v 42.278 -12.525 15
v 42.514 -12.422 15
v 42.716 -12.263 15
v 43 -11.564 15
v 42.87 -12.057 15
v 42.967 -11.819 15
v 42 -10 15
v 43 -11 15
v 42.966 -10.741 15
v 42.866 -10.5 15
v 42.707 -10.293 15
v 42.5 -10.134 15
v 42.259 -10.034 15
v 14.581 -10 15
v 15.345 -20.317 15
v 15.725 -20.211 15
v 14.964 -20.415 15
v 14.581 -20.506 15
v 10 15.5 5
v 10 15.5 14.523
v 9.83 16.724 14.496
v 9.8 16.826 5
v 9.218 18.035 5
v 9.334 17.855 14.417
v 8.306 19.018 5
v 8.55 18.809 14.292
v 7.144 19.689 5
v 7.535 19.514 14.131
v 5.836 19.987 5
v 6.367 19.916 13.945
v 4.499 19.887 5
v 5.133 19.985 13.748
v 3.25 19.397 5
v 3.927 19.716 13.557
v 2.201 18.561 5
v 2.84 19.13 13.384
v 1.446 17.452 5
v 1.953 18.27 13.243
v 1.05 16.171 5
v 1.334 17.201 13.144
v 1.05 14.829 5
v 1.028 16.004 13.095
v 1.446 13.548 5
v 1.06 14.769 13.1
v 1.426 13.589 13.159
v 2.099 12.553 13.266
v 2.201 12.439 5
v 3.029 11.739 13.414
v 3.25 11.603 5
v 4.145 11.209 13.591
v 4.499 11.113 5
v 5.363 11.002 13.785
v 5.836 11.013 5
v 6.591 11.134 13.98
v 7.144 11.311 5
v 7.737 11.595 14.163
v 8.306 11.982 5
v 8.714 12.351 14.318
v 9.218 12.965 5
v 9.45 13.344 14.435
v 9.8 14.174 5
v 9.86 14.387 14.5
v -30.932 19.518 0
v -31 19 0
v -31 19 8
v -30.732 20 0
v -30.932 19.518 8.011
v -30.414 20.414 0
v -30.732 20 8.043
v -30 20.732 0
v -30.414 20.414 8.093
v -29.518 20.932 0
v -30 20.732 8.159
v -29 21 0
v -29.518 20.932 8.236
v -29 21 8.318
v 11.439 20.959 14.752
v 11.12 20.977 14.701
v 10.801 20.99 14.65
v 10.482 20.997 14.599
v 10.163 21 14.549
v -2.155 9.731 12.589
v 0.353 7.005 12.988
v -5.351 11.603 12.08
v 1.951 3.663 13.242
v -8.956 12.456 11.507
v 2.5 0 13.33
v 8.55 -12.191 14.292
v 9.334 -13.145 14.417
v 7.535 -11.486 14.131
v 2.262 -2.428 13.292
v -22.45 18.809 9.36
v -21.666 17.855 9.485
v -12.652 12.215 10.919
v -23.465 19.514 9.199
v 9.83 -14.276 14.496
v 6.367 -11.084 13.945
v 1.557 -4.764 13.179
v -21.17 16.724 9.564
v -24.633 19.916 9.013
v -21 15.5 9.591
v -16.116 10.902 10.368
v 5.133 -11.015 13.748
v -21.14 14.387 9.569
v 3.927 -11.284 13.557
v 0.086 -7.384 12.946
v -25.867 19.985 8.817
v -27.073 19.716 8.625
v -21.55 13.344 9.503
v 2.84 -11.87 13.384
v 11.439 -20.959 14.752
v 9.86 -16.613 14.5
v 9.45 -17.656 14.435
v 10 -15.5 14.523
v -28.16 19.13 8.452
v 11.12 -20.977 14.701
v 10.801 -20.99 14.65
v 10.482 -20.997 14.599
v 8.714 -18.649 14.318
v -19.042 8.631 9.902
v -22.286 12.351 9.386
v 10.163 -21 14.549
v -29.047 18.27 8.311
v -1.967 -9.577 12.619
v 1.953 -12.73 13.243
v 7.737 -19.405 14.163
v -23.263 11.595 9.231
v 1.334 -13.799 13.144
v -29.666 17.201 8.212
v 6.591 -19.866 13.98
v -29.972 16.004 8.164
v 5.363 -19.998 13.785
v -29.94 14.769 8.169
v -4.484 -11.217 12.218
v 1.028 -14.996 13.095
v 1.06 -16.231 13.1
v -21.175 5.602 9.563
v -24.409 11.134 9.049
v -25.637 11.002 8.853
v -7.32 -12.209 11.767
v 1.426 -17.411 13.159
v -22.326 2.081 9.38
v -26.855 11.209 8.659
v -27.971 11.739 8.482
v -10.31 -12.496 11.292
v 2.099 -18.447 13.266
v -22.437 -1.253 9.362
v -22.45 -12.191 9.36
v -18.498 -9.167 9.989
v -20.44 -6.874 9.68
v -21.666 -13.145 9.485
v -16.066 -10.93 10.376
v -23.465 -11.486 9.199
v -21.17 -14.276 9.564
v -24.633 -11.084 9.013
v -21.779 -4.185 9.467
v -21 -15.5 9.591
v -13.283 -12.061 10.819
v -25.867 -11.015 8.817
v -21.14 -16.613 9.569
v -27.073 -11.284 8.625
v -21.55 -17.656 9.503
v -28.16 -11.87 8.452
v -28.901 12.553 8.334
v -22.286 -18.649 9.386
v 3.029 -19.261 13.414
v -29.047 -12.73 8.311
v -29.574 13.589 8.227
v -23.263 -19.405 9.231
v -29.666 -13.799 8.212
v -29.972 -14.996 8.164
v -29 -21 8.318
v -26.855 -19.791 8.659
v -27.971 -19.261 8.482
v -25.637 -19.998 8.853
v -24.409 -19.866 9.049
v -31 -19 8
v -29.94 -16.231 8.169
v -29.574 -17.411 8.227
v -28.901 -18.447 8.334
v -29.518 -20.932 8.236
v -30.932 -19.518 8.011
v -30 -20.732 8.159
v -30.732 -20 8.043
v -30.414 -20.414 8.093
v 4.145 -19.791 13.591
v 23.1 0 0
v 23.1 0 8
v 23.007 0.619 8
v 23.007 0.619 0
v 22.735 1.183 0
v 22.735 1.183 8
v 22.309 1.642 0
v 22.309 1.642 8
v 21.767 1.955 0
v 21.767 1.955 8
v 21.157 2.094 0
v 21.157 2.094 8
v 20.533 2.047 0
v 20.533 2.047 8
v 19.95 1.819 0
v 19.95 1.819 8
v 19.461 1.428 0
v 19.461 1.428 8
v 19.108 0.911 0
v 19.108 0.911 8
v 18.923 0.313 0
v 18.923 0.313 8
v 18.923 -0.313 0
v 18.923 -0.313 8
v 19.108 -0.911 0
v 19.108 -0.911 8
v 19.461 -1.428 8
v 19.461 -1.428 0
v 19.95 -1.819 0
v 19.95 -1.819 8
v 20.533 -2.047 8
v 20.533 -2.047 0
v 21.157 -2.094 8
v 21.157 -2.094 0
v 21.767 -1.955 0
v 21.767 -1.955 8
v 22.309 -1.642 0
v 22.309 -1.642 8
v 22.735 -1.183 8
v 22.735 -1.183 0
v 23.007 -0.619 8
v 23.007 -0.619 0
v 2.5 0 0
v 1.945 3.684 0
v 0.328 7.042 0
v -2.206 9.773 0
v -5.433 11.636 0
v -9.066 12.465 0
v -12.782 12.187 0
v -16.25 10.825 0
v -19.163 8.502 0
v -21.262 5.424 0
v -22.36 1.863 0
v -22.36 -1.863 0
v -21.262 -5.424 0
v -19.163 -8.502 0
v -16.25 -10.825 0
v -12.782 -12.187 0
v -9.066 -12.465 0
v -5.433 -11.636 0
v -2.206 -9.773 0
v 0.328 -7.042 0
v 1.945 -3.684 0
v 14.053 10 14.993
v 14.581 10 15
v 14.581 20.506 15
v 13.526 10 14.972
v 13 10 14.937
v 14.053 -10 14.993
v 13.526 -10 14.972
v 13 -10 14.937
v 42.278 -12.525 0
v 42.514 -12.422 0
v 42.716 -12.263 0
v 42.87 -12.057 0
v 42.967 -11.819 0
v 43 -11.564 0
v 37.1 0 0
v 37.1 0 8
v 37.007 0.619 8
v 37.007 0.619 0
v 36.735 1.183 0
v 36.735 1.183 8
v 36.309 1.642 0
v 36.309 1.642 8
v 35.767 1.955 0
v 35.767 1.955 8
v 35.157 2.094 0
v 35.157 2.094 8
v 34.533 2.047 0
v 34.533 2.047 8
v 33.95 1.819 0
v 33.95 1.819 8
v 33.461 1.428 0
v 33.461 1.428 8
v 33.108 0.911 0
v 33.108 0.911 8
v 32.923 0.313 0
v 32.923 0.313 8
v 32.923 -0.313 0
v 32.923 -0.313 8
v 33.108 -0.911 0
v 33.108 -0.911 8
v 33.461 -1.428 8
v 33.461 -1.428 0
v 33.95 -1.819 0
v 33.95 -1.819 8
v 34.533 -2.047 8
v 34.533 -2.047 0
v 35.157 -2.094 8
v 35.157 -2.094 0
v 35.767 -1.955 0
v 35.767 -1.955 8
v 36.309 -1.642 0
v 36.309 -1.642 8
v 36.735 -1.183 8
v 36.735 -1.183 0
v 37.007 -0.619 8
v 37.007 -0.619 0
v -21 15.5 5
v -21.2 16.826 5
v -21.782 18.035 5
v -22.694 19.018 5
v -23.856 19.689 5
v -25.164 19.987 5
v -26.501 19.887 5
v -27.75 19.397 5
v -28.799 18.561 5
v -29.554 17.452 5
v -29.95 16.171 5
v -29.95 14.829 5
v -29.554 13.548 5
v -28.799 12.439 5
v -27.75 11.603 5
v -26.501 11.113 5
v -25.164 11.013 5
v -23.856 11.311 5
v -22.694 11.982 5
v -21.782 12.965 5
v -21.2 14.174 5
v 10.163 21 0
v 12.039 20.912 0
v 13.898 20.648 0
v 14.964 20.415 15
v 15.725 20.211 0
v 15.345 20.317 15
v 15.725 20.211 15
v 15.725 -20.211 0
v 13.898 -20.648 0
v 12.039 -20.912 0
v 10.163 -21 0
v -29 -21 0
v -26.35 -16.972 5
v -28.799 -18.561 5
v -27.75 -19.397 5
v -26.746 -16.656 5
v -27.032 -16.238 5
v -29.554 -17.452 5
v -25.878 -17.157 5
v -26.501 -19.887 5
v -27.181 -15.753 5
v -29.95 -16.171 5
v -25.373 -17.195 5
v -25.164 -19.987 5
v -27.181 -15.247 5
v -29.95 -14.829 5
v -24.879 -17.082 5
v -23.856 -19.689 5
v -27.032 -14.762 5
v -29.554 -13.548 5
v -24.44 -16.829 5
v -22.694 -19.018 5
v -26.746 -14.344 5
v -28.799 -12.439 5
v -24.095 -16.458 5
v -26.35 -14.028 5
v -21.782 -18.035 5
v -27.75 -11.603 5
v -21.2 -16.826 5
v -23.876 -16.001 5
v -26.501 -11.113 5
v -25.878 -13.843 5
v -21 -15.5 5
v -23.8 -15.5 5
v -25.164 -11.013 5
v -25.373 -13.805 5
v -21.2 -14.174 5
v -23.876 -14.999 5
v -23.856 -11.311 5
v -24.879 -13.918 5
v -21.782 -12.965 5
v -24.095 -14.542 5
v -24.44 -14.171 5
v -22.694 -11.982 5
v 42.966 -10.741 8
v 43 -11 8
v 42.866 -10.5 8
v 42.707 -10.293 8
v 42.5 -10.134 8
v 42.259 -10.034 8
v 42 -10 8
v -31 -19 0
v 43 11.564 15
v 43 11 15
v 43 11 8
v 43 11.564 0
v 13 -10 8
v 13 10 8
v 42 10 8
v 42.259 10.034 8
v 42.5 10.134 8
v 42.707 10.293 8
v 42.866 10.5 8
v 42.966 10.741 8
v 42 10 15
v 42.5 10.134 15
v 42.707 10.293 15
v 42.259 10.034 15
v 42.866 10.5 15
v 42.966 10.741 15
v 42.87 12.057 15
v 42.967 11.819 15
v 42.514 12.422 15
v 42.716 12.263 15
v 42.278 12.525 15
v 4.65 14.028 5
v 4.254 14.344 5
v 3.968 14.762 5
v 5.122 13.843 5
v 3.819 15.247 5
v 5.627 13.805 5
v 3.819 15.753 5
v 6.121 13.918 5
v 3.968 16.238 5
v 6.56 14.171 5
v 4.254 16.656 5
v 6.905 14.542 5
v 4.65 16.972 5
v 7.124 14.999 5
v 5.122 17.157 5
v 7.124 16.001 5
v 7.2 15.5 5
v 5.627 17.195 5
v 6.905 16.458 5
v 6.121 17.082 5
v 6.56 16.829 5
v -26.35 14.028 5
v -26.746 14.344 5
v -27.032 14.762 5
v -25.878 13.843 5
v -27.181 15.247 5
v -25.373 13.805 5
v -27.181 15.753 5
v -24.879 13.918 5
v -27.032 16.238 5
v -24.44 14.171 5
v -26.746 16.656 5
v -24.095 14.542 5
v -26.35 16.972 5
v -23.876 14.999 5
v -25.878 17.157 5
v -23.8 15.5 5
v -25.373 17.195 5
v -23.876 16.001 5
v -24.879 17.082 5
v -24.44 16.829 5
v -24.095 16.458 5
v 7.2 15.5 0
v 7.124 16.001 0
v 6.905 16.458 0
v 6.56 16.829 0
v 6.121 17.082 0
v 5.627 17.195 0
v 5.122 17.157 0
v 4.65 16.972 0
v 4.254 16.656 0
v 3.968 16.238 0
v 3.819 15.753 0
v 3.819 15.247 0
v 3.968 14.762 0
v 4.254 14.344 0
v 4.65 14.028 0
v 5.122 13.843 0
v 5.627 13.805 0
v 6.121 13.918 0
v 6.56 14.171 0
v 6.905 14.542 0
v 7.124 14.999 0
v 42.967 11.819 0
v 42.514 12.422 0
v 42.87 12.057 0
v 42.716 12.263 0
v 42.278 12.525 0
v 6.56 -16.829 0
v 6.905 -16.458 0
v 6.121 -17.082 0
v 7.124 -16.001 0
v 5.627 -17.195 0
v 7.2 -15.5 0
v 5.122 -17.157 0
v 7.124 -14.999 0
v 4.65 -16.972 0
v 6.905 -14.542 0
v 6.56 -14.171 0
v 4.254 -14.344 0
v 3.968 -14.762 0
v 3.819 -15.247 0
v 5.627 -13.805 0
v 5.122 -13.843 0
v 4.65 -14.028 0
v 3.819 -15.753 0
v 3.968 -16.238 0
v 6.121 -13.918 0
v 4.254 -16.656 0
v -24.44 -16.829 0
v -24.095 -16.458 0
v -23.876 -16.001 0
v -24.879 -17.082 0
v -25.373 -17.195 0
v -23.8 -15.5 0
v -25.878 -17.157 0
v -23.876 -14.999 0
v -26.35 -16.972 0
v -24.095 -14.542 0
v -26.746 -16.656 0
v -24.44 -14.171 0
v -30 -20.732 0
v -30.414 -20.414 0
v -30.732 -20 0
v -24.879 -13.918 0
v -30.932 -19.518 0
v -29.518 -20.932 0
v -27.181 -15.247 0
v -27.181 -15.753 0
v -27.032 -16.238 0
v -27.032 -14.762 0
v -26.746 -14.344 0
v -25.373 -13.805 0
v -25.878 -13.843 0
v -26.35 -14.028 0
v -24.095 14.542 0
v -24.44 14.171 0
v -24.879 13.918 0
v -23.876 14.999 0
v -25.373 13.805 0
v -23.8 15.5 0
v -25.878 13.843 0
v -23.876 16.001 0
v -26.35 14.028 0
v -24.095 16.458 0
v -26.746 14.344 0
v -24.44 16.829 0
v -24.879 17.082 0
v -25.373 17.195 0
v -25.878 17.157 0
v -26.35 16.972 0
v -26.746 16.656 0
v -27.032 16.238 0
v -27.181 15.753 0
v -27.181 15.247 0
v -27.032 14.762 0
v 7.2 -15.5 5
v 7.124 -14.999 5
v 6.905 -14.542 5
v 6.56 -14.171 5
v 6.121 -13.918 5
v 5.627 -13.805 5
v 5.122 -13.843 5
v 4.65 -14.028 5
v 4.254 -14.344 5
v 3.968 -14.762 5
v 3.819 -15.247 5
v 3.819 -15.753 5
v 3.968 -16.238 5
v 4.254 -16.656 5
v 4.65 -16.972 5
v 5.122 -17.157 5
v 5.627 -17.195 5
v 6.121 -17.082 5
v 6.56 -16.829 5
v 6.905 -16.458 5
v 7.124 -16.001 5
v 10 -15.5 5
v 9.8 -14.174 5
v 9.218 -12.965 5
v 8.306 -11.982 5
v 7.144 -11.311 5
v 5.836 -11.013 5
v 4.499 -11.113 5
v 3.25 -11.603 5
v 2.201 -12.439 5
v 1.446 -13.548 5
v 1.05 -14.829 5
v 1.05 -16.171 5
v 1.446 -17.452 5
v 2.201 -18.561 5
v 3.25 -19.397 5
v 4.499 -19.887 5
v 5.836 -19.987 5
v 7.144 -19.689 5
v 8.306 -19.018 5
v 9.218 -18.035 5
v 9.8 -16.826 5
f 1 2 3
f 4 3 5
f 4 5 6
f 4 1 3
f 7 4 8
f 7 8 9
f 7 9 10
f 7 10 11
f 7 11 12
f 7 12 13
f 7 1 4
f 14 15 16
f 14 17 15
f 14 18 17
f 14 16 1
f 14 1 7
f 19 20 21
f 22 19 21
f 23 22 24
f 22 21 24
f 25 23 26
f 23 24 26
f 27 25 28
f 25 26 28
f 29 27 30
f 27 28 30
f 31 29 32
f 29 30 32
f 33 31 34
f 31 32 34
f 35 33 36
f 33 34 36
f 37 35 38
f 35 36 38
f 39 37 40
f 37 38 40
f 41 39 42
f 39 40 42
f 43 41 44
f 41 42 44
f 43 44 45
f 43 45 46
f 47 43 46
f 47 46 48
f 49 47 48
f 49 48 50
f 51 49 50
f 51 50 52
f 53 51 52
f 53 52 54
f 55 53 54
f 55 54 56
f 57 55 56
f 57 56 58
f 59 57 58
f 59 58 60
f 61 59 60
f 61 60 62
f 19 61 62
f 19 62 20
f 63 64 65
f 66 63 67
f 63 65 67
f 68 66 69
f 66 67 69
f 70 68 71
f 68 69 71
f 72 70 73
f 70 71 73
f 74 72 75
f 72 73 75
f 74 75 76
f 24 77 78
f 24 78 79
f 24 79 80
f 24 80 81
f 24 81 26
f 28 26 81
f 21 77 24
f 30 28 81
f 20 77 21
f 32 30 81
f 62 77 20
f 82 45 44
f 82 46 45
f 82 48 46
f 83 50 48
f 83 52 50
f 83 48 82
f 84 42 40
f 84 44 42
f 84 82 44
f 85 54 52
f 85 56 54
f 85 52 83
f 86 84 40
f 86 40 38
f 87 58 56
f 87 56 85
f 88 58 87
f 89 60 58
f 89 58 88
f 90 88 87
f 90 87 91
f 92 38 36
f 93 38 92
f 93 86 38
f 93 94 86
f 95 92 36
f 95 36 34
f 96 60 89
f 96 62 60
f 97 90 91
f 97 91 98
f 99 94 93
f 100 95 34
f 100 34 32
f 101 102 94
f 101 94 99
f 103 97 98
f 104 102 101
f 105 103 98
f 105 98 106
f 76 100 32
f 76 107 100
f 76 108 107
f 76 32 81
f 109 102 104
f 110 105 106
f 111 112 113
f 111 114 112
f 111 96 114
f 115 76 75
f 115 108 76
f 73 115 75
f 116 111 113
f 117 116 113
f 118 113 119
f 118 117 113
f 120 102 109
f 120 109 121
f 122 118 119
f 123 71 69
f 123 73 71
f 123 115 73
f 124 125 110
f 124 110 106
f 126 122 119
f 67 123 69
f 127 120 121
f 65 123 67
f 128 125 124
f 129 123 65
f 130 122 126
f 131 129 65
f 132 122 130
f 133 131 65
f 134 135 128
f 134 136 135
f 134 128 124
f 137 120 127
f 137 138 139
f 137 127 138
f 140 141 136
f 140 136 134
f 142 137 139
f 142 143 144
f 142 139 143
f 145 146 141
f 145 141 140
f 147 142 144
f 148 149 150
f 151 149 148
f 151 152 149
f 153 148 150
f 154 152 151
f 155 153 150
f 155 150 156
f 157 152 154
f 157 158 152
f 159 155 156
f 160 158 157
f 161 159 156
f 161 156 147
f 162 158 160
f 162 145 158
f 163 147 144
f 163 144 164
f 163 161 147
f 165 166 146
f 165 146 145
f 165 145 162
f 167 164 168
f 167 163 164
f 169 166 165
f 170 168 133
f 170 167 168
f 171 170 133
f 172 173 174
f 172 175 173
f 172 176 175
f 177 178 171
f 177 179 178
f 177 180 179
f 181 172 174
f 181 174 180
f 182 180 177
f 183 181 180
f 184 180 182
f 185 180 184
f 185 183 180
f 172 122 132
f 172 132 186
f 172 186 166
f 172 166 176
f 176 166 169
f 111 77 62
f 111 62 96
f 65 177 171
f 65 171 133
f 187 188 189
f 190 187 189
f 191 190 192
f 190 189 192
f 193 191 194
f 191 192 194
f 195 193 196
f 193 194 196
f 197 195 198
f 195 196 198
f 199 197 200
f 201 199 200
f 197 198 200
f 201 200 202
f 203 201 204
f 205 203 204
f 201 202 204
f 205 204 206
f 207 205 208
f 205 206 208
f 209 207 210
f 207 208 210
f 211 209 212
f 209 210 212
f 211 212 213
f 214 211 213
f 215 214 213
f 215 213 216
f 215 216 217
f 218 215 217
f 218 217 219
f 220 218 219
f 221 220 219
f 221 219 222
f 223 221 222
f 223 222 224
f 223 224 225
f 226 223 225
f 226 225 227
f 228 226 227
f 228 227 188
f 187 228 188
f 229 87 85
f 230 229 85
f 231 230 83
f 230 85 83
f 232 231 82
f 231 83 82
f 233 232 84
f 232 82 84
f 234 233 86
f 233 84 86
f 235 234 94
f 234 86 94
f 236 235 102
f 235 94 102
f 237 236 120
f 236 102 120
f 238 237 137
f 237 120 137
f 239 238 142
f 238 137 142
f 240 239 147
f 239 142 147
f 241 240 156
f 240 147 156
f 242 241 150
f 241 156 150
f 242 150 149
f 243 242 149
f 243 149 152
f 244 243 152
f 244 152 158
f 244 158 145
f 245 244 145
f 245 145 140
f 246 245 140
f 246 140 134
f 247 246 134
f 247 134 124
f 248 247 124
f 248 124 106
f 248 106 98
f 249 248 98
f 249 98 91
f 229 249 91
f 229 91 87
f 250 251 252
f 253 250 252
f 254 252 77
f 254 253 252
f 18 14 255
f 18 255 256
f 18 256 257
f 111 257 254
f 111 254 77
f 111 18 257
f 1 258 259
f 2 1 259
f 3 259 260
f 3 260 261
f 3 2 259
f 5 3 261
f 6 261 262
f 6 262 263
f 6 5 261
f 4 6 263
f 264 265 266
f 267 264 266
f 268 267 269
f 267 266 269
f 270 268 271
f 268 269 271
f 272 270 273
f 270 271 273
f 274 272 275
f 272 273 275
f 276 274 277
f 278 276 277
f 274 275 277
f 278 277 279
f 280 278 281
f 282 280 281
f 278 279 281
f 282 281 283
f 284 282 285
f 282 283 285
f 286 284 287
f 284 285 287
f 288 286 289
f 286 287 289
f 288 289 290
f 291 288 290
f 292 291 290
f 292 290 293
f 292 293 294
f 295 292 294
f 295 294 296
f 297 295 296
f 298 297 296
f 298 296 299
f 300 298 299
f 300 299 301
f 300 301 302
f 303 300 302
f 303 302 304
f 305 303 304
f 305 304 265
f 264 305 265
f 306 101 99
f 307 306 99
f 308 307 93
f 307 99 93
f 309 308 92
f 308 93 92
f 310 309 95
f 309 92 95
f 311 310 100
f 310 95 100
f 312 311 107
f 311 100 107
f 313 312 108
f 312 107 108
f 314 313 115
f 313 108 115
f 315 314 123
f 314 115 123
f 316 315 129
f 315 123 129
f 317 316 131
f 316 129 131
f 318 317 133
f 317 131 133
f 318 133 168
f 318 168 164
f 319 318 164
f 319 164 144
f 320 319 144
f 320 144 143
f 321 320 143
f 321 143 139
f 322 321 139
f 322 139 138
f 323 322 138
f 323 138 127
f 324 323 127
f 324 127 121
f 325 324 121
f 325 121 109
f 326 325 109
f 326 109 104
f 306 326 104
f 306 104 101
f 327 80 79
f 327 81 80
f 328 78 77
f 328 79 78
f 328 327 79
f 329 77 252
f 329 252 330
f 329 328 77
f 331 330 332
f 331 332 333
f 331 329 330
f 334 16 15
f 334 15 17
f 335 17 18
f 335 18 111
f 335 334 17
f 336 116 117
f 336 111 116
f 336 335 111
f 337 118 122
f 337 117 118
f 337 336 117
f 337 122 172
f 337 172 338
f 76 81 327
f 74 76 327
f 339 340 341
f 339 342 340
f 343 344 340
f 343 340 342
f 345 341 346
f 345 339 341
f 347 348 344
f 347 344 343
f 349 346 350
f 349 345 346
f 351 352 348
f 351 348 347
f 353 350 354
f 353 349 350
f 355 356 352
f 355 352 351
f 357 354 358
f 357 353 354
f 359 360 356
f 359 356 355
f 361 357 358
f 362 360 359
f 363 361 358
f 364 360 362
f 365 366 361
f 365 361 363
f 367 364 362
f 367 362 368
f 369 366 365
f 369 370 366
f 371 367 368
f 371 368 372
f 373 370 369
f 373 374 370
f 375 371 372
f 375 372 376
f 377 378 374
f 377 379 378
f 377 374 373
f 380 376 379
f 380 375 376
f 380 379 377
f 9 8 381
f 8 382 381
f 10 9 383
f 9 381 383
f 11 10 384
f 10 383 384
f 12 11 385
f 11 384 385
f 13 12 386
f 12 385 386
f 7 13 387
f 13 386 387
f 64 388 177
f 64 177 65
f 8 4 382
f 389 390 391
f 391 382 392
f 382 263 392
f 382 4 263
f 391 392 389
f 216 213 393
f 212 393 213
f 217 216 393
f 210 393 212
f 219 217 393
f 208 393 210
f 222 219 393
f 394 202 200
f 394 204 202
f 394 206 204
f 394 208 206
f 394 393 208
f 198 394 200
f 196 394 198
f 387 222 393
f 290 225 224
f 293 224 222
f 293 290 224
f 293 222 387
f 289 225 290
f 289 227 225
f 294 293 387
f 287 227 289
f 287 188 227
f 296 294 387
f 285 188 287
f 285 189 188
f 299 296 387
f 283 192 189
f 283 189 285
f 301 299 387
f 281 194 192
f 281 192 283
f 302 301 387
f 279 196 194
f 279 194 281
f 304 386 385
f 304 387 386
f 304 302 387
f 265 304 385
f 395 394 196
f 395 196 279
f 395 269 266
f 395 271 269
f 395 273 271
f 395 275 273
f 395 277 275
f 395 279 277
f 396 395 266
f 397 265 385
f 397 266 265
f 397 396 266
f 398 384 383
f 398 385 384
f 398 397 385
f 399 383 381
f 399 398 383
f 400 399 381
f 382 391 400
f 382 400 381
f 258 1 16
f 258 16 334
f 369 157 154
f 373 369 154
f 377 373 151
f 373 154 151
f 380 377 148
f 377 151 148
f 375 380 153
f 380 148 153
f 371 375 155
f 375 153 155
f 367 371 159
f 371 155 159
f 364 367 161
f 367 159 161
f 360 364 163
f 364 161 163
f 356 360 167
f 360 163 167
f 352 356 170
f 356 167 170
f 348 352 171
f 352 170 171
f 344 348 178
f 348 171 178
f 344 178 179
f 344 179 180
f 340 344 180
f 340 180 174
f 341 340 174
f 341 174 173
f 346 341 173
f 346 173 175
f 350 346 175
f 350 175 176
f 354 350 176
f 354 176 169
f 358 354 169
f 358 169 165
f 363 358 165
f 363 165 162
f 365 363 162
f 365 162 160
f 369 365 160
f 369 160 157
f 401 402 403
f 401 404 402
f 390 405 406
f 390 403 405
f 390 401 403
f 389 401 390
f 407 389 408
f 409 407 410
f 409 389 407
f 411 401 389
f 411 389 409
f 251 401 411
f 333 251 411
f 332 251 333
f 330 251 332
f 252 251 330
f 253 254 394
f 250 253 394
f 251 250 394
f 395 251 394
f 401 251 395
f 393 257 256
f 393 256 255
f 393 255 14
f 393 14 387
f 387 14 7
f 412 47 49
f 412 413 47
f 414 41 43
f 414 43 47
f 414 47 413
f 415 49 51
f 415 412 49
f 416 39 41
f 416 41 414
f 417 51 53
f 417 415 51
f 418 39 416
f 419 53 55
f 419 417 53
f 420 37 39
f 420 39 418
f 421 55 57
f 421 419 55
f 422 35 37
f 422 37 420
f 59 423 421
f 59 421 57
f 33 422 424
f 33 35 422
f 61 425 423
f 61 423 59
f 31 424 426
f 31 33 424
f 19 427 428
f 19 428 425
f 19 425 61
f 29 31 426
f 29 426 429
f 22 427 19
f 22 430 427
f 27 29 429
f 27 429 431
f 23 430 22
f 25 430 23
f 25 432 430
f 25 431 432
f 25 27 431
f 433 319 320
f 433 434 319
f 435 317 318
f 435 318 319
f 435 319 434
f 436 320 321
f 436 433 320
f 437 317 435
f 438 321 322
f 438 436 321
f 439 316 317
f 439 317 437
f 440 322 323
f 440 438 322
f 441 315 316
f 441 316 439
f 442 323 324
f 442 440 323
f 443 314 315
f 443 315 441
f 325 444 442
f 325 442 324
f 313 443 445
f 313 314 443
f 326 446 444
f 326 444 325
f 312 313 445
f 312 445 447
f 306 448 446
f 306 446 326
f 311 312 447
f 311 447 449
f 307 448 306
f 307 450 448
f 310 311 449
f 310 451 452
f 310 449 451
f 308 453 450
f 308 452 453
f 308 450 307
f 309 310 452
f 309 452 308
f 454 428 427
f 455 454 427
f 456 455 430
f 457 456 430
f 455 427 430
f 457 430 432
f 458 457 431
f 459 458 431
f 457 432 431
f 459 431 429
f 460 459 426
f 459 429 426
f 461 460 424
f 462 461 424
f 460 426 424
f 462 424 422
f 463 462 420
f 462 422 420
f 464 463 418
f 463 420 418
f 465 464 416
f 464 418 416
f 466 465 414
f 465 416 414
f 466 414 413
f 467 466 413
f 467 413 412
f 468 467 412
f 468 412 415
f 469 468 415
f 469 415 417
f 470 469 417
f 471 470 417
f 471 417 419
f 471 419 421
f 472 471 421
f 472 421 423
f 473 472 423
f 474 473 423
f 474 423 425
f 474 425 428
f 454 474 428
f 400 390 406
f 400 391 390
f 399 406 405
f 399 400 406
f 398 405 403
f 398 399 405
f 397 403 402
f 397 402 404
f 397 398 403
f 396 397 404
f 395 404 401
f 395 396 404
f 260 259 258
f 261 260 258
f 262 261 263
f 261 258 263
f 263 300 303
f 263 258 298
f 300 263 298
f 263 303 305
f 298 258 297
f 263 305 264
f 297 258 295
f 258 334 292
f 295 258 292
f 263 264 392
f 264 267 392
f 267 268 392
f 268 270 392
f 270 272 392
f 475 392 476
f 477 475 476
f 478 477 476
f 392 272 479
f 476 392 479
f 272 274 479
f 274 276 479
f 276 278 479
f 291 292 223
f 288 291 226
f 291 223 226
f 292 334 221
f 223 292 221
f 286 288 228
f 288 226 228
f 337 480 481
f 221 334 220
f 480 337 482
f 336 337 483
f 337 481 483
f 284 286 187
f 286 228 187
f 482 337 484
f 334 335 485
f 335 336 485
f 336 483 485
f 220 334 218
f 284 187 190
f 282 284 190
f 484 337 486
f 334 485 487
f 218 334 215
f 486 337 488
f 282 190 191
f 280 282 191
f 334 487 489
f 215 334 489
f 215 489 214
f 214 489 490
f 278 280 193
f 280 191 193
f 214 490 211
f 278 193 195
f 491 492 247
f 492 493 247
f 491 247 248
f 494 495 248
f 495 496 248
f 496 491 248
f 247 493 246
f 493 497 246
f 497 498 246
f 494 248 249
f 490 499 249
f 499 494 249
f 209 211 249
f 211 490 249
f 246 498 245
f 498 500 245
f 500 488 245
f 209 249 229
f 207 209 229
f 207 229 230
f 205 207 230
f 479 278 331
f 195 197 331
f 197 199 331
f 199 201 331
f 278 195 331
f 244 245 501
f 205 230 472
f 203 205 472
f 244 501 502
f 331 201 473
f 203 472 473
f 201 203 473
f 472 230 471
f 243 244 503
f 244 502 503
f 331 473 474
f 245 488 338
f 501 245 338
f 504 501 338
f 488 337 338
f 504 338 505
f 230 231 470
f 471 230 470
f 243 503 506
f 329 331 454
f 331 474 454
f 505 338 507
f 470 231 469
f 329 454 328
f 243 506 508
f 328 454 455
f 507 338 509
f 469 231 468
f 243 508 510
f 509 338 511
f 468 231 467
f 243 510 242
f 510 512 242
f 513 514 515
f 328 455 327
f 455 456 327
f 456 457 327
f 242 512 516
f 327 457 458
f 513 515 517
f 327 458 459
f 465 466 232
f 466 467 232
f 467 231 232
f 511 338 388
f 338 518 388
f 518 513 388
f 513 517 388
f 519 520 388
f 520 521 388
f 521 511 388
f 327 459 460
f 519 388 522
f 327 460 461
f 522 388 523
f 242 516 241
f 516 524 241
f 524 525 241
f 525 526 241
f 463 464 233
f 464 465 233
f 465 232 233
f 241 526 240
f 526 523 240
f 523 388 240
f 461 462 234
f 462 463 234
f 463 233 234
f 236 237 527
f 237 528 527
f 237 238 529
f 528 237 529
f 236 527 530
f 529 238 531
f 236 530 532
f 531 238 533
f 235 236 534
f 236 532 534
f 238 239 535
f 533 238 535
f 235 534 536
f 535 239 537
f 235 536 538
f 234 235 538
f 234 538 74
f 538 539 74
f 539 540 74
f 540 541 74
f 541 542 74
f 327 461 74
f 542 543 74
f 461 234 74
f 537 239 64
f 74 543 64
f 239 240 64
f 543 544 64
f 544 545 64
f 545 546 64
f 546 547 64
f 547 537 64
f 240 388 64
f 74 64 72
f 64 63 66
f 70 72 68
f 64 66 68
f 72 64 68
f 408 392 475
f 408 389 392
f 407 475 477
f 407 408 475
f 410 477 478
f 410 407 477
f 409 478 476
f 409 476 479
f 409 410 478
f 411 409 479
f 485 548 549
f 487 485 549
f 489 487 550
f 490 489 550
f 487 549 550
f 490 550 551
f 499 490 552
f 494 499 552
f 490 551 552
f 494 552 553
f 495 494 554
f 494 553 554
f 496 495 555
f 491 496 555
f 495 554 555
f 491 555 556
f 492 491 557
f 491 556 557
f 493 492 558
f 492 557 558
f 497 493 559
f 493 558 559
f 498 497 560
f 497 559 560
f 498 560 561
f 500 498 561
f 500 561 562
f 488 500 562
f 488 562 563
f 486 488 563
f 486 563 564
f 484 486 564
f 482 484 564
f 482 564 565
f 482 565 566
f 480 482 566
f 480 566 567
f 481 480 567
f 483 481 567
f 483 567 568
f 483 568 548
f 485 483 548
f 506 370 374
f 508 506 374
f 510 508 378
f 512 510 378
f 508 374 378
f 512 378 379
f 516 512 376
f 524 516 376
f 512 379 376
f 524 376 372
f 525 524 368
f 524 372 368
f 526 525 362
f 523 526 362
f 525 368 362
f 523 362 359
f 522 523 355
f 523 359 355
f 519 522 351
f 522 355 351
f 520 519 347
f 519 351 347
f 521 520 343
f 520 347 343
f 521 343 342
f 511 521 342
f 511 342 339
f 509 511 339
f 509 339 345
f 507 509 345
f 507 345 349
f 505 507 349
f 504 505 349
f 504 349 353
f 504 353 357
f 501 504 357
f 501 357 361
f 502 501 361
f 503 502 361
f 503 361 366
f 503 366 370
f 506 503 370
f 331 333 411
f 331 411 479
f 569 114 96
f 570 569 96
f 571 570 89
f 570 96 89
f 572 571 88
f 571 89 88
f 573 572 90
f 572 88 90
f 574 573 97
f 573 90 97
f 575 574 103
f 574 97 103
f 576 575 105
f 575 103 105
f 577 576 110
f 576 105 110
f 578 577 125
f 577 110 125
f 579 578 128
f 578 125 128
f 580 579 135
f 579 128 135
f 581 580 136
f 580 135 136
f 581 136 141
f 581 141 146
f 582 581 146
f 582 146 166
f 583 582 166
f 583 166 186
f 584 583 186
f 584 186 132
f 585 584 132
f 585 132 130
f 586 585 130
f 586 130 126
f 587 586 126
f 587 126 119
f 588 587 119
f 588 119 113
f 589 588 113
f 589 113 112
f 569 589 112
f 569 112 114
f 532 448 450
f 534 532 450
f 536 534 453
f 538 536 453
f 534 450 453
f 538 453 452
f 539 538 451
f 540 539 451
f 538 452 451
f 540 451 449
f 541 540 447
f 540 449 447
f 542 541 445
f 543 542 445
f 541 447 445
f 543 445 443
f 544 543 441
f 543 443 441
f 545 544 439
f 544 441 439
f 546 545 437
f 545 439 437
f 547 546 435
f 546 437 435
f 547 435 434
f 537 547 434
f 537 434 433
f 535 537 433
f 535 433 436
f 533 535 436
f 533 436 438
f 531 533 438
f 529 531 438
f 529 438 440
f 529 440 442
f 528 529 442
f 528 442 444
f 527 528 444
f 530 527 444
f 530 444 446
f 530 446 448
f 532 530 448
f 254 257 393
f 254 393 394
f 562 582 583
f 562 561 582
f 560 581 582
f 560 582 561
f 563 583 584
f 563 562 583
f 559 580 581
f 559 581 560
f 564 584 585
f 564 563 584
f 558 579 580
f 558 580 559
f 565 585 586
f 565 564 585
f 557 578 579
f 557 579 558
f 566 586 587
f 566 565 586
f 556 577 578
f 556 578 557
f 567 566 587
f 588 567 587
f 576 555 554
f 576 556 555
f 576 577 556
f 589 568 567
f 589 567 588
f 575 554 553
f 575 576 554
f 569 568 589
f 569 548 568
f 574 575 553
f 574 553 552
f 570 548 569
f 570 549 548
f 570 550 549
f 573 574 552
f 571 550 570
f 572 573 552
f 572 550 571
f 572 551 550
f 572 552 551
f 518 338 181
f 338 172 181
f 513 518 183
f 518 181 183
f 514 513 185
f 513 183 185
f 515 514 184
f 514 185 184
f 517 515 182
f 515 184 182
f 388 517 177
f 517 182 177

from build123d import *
from OCP.BRepFilletAPI import BRepFilletAPI_MakeChamfer

# Parameters (mm, degrees)
ESQUISSE1_W             = 62
ESQUISSE1_H             = 42
BOSS_EXTRU_1_DEPTH      = 15
ESQUISSE2_R             = 2.1
ESQUISSE2_R_2           = 12.5
ESQUISSE2_R_3           = 1.7
ENL_V_MAT_EXTRU_1_DEPTH = 41.33608806
ESQUISSE4_R             = 4.5
ENL_V_MAT_EXTRU_2_DEPTH = 10
SKETCH1_W               = 20
SKETCH1_H               = 42
CUT_EXTRUDE1_DEPTH      = 41.33608806
SKETCH2_W               = 15
SKETCH2_H               = 42
BOSS_EXTRUDE1_DEPTH     = 40
CUT_EXTRUDE2_DEPTH      = 68.749538744
SKETCH7_W               = 38
SKETCH7_H               = 20
CUT_EXTRUDE3_DEPTH      = 7
SKETCH9_R               = 2.1
CUT_EXTRUDE4_DEPTH      = 56.731499172
CHAMFER1_SIZE           = 38
CHAMFER1_SIZE2          = 11
SKETCH10_W              = 8
SKETCH10_H              = 24.631578948
CUT_EXTRUDE5_DEPTH      = 58.15767665
FILLET2_START           = -1
FILLET2_DEPTH           = 17
FILLET2_START_2         = -22
FILLET2_2_DEPTH         = 44
FILLET4_R               = 2
FILLET5_R               = 1


with BuildPart() as part:
    # Esquisse1 → Boss.-Extru.1 (new body)
    with BuildSketch(Plane.XY):
        Rectangle(ESQUISSE1_W, ESQUISSE1_H)
    extrude(amount=BOSS_EXTRU_1_DEPTH)

    # Esquisse2 → Enlèv. mat.-Extru.1 (cut, through all)
    with BuildSketch(Plane.XY.offset(15)):
        with Locations((21, 11)):
            Circle(ESQUISSE2_R)
        with Locations((21, -11)):
            Circle(ESQUISSE2_R)
        with Locations((-10, 0)):
            Circle(ESQUISSE2_R_2)
        with Locations((-25.5, 15.5)):
            Circle(ESQUISSE2_R_3)
        with Locations((5.5, 15.5)):
            Circle(ESQUISSE2_R_3)
        with Locations((5.5, -15.5)):
            Circle(ESQUISSE2_R_3)
        with Locations((-25.5, -15.5)):
            Circle(ESQUISSE2_R_3)
    extrude(amount=-ENL_V_MAT_EXTRU_1_DEPTH, mode=Mode.SUBTRACT)

    # Esquisse4 → Enlèv. mat.-Extru.2 (cut)
    with BuildSketch(Plane.XY.offset(15)):
        with Locations((-25.5, 15.5)):
            Circle(ESQUISSE4_R)
        with Locations((-25.5, -15.5)):
            Circle(ESQUISSE4_R)
        with Locations((5.5, -15.5)):
            Circle(ESQUISSE4_R)
        with Locations((5.5, 15.5)):
            Circle(ESQUISSE4_R)
    extrude(amount=-ENL_V_MAT_EXTRU_2_DEPTH, mode=Mode.SUBTRACT)

    # Sketch1 → Cut-Extrude1 (cut, through all)
    with BuildSketch(Plane.XY.offset(15)):
        with Locations((21, 0)):
            Rectangle(SKETCH1_W, SKETCH1_H)
    extrude(amount=-CUT_EXTRUDE1_DEPTH, mode=Mode.SUBTRACT)

    # Sketch2 → Boss-Extrude1 (add)
    with BuildSketch(Plane(origin=(11, 0, 0), x_dir=(0, 0, -1), z_dir=(1, 0, 0))):
        with Locations((-7.5, 0)):
            Rectangle(SKETCH2_W, SKETCH2_H)
    extrude(amount=BOSS_EXTRUDE1_DEPTH)

    # Sketch6 → Cut-Extrude2 (cut, through all)
    with BuildSketch(Plane.XZ.offset(21)):
        Polygon((-31, 8), (-31, 15), (13, 15), align=None)
    extrude(amount=-CUT_EXTRUDE2_DEPTH, mode=Mode.SUBTRACT)

    # Sketch7 → Cut-Extrude3 (cut)
    with BuildSketch(Plane.XY.offset(15)):
        with Locations((32, 0)):
            Rectangle(SKETCH7_W, SKETCH7_H)
    extrude(amount=-CUT_EXTRUDE3_DEPTH, mode=Mode.SUBTRACT)

    # Sketch9 → Cut-Extrude4 (cut, through all)
    with BuildSketch(Plane.XY.offset(8)):
        with Locations((21, 0)):
            Circle(SKETCH9_R)
        with Locations((35, 0)):
            Circle(SKETCH9_R)
    extrude(amount=-CUT_EXTRUDE4_DEPTH, mode=Mode.SUBTRACT)

    # Chamfer1: one chamfer whose edges measure the first distance from different faces: ONE call of the kernel's chamfer builder (chamfer() names one face for all edges)
    chamfer1_edges_1 = [part.edges().sort_by_distance(p)[0] for p in [
        (51, 21, 7.5),
    ]]
    chamfer1_side_1 = [part.faces().sort_by_distance(p)[0] for p in [
        (13.76889715, 21, 6.760532838),
    ]]
    chamfer1_edges_2 = [part.edges().sort_by_distance(p)[0] for p in [
        (51, -21, 7.5),
    ]]
    chamfer1_side_2 = [part.faces().sort_by_distance(p)[0] for p in [
        (13.76889715, -21, 6.760532838),
    ]]
    chamfer1 = BRepFilletAPI_MakeChamfer(part.part.solid().wrapped)
    for e in chamfer1_edges_1:
        chamfer1.Add(CHAMFER1_SIZE, CHAMFER1_SIZE2, e.wrapped, chamfer1_side_1[0].wrapped)  # the first distance lies on this face
    for e in chamfer1_edges_2:
        chamfer1.Add(CHAMFER1_SIZE, CHAMFER1_SIZE2, e.wrapped, chamfer1_side_2[0].wrapped)  # the first distance lies on this face
    add(Compound.cast(chamfer1.Shape()), mode=Mode.REPLACE)

    # Sketch10 → Cut-Extrude5 (cut, through all)
    with BuildSketch(Plane(origin=(0, 0, 0), x_dir=(-1, 0, 0), z_dir=(0, 0, -1))):
        with Locations((-47, 0)):
            Rectangle(SKETCH10_W, SKETCH10_H)
    extrude(amount=-CUT_EXTRUDE5_DEPTH, mode=Mode.SUBTRACT)

    # Fillet2: read off the stored shape, not the designer's step
    # Fillet2 outline → Fillet2 (cut)
    with BuildSketch(Plane.XY.offset(FILLET2_START)):
        with BuildLine():
            Line((13, 21), (10.163489291, 21))
            ThreePointArc((10.163489291, 21), (12.9718958, 20.801839634), (15.724650822, 20.211285288))
            Line((15.724650822, 20.211285288), (13, 21))
        make_face()
        with BuildLine():
            ThreePointArc((15.724650822, -20.211285288), (12.9718958, -20.801839634), (10.163489291, -21))
            Line((10.163489291, -21), (13, -21))
            Line((13, -21), (15.724650822, -20.211285288))
        make_face()
    extrude(amount=FILLET2_DEPTH, mode=Mode.SUBTRACT)

    # Fillet2 2 outline → Fillet2 2 (cut)
    with BuildSketch(Plane(origin=(0, 0, 0), x_dir=(1, 0, 0), z_dir=(0, 1, 0)).offset(FILLET2_START_2)):
        with BuildLine():
            Line((11.438667082, -14.751606127), (13, -15))
            Line((13, -15), (14.580968057, -15))
            ThreePointArc((14.580968057, -15), (13.004916429, -14.937804826), (11.438667082, -14.751606127))
        make_face()
    extrude(amount=FILLET2_2_DEPTH, mode=Mode.SUBTRACT)

    # Fillet4
    fillet4_edges = [part.edges().sort_by_distance(p)[0] for p in [
        (-31, 21, 4),
        (-31, -21, 4),
    ]]
    fillet(fillet4_edges, radius=FILLET4_R)

    # Fillet5
    fillet5_edges = [part.edges().sort_by_distance(p)[0] for p in [
        (43, -10, 11.5),
        (43, 10, 11.5),
        (43, 12.315789474, 7.5),
        (43, -12.315789474, 7.5),
    ]]
    fillet(fillet5_edges, radius=FILLET5_R)


solid = part.part
